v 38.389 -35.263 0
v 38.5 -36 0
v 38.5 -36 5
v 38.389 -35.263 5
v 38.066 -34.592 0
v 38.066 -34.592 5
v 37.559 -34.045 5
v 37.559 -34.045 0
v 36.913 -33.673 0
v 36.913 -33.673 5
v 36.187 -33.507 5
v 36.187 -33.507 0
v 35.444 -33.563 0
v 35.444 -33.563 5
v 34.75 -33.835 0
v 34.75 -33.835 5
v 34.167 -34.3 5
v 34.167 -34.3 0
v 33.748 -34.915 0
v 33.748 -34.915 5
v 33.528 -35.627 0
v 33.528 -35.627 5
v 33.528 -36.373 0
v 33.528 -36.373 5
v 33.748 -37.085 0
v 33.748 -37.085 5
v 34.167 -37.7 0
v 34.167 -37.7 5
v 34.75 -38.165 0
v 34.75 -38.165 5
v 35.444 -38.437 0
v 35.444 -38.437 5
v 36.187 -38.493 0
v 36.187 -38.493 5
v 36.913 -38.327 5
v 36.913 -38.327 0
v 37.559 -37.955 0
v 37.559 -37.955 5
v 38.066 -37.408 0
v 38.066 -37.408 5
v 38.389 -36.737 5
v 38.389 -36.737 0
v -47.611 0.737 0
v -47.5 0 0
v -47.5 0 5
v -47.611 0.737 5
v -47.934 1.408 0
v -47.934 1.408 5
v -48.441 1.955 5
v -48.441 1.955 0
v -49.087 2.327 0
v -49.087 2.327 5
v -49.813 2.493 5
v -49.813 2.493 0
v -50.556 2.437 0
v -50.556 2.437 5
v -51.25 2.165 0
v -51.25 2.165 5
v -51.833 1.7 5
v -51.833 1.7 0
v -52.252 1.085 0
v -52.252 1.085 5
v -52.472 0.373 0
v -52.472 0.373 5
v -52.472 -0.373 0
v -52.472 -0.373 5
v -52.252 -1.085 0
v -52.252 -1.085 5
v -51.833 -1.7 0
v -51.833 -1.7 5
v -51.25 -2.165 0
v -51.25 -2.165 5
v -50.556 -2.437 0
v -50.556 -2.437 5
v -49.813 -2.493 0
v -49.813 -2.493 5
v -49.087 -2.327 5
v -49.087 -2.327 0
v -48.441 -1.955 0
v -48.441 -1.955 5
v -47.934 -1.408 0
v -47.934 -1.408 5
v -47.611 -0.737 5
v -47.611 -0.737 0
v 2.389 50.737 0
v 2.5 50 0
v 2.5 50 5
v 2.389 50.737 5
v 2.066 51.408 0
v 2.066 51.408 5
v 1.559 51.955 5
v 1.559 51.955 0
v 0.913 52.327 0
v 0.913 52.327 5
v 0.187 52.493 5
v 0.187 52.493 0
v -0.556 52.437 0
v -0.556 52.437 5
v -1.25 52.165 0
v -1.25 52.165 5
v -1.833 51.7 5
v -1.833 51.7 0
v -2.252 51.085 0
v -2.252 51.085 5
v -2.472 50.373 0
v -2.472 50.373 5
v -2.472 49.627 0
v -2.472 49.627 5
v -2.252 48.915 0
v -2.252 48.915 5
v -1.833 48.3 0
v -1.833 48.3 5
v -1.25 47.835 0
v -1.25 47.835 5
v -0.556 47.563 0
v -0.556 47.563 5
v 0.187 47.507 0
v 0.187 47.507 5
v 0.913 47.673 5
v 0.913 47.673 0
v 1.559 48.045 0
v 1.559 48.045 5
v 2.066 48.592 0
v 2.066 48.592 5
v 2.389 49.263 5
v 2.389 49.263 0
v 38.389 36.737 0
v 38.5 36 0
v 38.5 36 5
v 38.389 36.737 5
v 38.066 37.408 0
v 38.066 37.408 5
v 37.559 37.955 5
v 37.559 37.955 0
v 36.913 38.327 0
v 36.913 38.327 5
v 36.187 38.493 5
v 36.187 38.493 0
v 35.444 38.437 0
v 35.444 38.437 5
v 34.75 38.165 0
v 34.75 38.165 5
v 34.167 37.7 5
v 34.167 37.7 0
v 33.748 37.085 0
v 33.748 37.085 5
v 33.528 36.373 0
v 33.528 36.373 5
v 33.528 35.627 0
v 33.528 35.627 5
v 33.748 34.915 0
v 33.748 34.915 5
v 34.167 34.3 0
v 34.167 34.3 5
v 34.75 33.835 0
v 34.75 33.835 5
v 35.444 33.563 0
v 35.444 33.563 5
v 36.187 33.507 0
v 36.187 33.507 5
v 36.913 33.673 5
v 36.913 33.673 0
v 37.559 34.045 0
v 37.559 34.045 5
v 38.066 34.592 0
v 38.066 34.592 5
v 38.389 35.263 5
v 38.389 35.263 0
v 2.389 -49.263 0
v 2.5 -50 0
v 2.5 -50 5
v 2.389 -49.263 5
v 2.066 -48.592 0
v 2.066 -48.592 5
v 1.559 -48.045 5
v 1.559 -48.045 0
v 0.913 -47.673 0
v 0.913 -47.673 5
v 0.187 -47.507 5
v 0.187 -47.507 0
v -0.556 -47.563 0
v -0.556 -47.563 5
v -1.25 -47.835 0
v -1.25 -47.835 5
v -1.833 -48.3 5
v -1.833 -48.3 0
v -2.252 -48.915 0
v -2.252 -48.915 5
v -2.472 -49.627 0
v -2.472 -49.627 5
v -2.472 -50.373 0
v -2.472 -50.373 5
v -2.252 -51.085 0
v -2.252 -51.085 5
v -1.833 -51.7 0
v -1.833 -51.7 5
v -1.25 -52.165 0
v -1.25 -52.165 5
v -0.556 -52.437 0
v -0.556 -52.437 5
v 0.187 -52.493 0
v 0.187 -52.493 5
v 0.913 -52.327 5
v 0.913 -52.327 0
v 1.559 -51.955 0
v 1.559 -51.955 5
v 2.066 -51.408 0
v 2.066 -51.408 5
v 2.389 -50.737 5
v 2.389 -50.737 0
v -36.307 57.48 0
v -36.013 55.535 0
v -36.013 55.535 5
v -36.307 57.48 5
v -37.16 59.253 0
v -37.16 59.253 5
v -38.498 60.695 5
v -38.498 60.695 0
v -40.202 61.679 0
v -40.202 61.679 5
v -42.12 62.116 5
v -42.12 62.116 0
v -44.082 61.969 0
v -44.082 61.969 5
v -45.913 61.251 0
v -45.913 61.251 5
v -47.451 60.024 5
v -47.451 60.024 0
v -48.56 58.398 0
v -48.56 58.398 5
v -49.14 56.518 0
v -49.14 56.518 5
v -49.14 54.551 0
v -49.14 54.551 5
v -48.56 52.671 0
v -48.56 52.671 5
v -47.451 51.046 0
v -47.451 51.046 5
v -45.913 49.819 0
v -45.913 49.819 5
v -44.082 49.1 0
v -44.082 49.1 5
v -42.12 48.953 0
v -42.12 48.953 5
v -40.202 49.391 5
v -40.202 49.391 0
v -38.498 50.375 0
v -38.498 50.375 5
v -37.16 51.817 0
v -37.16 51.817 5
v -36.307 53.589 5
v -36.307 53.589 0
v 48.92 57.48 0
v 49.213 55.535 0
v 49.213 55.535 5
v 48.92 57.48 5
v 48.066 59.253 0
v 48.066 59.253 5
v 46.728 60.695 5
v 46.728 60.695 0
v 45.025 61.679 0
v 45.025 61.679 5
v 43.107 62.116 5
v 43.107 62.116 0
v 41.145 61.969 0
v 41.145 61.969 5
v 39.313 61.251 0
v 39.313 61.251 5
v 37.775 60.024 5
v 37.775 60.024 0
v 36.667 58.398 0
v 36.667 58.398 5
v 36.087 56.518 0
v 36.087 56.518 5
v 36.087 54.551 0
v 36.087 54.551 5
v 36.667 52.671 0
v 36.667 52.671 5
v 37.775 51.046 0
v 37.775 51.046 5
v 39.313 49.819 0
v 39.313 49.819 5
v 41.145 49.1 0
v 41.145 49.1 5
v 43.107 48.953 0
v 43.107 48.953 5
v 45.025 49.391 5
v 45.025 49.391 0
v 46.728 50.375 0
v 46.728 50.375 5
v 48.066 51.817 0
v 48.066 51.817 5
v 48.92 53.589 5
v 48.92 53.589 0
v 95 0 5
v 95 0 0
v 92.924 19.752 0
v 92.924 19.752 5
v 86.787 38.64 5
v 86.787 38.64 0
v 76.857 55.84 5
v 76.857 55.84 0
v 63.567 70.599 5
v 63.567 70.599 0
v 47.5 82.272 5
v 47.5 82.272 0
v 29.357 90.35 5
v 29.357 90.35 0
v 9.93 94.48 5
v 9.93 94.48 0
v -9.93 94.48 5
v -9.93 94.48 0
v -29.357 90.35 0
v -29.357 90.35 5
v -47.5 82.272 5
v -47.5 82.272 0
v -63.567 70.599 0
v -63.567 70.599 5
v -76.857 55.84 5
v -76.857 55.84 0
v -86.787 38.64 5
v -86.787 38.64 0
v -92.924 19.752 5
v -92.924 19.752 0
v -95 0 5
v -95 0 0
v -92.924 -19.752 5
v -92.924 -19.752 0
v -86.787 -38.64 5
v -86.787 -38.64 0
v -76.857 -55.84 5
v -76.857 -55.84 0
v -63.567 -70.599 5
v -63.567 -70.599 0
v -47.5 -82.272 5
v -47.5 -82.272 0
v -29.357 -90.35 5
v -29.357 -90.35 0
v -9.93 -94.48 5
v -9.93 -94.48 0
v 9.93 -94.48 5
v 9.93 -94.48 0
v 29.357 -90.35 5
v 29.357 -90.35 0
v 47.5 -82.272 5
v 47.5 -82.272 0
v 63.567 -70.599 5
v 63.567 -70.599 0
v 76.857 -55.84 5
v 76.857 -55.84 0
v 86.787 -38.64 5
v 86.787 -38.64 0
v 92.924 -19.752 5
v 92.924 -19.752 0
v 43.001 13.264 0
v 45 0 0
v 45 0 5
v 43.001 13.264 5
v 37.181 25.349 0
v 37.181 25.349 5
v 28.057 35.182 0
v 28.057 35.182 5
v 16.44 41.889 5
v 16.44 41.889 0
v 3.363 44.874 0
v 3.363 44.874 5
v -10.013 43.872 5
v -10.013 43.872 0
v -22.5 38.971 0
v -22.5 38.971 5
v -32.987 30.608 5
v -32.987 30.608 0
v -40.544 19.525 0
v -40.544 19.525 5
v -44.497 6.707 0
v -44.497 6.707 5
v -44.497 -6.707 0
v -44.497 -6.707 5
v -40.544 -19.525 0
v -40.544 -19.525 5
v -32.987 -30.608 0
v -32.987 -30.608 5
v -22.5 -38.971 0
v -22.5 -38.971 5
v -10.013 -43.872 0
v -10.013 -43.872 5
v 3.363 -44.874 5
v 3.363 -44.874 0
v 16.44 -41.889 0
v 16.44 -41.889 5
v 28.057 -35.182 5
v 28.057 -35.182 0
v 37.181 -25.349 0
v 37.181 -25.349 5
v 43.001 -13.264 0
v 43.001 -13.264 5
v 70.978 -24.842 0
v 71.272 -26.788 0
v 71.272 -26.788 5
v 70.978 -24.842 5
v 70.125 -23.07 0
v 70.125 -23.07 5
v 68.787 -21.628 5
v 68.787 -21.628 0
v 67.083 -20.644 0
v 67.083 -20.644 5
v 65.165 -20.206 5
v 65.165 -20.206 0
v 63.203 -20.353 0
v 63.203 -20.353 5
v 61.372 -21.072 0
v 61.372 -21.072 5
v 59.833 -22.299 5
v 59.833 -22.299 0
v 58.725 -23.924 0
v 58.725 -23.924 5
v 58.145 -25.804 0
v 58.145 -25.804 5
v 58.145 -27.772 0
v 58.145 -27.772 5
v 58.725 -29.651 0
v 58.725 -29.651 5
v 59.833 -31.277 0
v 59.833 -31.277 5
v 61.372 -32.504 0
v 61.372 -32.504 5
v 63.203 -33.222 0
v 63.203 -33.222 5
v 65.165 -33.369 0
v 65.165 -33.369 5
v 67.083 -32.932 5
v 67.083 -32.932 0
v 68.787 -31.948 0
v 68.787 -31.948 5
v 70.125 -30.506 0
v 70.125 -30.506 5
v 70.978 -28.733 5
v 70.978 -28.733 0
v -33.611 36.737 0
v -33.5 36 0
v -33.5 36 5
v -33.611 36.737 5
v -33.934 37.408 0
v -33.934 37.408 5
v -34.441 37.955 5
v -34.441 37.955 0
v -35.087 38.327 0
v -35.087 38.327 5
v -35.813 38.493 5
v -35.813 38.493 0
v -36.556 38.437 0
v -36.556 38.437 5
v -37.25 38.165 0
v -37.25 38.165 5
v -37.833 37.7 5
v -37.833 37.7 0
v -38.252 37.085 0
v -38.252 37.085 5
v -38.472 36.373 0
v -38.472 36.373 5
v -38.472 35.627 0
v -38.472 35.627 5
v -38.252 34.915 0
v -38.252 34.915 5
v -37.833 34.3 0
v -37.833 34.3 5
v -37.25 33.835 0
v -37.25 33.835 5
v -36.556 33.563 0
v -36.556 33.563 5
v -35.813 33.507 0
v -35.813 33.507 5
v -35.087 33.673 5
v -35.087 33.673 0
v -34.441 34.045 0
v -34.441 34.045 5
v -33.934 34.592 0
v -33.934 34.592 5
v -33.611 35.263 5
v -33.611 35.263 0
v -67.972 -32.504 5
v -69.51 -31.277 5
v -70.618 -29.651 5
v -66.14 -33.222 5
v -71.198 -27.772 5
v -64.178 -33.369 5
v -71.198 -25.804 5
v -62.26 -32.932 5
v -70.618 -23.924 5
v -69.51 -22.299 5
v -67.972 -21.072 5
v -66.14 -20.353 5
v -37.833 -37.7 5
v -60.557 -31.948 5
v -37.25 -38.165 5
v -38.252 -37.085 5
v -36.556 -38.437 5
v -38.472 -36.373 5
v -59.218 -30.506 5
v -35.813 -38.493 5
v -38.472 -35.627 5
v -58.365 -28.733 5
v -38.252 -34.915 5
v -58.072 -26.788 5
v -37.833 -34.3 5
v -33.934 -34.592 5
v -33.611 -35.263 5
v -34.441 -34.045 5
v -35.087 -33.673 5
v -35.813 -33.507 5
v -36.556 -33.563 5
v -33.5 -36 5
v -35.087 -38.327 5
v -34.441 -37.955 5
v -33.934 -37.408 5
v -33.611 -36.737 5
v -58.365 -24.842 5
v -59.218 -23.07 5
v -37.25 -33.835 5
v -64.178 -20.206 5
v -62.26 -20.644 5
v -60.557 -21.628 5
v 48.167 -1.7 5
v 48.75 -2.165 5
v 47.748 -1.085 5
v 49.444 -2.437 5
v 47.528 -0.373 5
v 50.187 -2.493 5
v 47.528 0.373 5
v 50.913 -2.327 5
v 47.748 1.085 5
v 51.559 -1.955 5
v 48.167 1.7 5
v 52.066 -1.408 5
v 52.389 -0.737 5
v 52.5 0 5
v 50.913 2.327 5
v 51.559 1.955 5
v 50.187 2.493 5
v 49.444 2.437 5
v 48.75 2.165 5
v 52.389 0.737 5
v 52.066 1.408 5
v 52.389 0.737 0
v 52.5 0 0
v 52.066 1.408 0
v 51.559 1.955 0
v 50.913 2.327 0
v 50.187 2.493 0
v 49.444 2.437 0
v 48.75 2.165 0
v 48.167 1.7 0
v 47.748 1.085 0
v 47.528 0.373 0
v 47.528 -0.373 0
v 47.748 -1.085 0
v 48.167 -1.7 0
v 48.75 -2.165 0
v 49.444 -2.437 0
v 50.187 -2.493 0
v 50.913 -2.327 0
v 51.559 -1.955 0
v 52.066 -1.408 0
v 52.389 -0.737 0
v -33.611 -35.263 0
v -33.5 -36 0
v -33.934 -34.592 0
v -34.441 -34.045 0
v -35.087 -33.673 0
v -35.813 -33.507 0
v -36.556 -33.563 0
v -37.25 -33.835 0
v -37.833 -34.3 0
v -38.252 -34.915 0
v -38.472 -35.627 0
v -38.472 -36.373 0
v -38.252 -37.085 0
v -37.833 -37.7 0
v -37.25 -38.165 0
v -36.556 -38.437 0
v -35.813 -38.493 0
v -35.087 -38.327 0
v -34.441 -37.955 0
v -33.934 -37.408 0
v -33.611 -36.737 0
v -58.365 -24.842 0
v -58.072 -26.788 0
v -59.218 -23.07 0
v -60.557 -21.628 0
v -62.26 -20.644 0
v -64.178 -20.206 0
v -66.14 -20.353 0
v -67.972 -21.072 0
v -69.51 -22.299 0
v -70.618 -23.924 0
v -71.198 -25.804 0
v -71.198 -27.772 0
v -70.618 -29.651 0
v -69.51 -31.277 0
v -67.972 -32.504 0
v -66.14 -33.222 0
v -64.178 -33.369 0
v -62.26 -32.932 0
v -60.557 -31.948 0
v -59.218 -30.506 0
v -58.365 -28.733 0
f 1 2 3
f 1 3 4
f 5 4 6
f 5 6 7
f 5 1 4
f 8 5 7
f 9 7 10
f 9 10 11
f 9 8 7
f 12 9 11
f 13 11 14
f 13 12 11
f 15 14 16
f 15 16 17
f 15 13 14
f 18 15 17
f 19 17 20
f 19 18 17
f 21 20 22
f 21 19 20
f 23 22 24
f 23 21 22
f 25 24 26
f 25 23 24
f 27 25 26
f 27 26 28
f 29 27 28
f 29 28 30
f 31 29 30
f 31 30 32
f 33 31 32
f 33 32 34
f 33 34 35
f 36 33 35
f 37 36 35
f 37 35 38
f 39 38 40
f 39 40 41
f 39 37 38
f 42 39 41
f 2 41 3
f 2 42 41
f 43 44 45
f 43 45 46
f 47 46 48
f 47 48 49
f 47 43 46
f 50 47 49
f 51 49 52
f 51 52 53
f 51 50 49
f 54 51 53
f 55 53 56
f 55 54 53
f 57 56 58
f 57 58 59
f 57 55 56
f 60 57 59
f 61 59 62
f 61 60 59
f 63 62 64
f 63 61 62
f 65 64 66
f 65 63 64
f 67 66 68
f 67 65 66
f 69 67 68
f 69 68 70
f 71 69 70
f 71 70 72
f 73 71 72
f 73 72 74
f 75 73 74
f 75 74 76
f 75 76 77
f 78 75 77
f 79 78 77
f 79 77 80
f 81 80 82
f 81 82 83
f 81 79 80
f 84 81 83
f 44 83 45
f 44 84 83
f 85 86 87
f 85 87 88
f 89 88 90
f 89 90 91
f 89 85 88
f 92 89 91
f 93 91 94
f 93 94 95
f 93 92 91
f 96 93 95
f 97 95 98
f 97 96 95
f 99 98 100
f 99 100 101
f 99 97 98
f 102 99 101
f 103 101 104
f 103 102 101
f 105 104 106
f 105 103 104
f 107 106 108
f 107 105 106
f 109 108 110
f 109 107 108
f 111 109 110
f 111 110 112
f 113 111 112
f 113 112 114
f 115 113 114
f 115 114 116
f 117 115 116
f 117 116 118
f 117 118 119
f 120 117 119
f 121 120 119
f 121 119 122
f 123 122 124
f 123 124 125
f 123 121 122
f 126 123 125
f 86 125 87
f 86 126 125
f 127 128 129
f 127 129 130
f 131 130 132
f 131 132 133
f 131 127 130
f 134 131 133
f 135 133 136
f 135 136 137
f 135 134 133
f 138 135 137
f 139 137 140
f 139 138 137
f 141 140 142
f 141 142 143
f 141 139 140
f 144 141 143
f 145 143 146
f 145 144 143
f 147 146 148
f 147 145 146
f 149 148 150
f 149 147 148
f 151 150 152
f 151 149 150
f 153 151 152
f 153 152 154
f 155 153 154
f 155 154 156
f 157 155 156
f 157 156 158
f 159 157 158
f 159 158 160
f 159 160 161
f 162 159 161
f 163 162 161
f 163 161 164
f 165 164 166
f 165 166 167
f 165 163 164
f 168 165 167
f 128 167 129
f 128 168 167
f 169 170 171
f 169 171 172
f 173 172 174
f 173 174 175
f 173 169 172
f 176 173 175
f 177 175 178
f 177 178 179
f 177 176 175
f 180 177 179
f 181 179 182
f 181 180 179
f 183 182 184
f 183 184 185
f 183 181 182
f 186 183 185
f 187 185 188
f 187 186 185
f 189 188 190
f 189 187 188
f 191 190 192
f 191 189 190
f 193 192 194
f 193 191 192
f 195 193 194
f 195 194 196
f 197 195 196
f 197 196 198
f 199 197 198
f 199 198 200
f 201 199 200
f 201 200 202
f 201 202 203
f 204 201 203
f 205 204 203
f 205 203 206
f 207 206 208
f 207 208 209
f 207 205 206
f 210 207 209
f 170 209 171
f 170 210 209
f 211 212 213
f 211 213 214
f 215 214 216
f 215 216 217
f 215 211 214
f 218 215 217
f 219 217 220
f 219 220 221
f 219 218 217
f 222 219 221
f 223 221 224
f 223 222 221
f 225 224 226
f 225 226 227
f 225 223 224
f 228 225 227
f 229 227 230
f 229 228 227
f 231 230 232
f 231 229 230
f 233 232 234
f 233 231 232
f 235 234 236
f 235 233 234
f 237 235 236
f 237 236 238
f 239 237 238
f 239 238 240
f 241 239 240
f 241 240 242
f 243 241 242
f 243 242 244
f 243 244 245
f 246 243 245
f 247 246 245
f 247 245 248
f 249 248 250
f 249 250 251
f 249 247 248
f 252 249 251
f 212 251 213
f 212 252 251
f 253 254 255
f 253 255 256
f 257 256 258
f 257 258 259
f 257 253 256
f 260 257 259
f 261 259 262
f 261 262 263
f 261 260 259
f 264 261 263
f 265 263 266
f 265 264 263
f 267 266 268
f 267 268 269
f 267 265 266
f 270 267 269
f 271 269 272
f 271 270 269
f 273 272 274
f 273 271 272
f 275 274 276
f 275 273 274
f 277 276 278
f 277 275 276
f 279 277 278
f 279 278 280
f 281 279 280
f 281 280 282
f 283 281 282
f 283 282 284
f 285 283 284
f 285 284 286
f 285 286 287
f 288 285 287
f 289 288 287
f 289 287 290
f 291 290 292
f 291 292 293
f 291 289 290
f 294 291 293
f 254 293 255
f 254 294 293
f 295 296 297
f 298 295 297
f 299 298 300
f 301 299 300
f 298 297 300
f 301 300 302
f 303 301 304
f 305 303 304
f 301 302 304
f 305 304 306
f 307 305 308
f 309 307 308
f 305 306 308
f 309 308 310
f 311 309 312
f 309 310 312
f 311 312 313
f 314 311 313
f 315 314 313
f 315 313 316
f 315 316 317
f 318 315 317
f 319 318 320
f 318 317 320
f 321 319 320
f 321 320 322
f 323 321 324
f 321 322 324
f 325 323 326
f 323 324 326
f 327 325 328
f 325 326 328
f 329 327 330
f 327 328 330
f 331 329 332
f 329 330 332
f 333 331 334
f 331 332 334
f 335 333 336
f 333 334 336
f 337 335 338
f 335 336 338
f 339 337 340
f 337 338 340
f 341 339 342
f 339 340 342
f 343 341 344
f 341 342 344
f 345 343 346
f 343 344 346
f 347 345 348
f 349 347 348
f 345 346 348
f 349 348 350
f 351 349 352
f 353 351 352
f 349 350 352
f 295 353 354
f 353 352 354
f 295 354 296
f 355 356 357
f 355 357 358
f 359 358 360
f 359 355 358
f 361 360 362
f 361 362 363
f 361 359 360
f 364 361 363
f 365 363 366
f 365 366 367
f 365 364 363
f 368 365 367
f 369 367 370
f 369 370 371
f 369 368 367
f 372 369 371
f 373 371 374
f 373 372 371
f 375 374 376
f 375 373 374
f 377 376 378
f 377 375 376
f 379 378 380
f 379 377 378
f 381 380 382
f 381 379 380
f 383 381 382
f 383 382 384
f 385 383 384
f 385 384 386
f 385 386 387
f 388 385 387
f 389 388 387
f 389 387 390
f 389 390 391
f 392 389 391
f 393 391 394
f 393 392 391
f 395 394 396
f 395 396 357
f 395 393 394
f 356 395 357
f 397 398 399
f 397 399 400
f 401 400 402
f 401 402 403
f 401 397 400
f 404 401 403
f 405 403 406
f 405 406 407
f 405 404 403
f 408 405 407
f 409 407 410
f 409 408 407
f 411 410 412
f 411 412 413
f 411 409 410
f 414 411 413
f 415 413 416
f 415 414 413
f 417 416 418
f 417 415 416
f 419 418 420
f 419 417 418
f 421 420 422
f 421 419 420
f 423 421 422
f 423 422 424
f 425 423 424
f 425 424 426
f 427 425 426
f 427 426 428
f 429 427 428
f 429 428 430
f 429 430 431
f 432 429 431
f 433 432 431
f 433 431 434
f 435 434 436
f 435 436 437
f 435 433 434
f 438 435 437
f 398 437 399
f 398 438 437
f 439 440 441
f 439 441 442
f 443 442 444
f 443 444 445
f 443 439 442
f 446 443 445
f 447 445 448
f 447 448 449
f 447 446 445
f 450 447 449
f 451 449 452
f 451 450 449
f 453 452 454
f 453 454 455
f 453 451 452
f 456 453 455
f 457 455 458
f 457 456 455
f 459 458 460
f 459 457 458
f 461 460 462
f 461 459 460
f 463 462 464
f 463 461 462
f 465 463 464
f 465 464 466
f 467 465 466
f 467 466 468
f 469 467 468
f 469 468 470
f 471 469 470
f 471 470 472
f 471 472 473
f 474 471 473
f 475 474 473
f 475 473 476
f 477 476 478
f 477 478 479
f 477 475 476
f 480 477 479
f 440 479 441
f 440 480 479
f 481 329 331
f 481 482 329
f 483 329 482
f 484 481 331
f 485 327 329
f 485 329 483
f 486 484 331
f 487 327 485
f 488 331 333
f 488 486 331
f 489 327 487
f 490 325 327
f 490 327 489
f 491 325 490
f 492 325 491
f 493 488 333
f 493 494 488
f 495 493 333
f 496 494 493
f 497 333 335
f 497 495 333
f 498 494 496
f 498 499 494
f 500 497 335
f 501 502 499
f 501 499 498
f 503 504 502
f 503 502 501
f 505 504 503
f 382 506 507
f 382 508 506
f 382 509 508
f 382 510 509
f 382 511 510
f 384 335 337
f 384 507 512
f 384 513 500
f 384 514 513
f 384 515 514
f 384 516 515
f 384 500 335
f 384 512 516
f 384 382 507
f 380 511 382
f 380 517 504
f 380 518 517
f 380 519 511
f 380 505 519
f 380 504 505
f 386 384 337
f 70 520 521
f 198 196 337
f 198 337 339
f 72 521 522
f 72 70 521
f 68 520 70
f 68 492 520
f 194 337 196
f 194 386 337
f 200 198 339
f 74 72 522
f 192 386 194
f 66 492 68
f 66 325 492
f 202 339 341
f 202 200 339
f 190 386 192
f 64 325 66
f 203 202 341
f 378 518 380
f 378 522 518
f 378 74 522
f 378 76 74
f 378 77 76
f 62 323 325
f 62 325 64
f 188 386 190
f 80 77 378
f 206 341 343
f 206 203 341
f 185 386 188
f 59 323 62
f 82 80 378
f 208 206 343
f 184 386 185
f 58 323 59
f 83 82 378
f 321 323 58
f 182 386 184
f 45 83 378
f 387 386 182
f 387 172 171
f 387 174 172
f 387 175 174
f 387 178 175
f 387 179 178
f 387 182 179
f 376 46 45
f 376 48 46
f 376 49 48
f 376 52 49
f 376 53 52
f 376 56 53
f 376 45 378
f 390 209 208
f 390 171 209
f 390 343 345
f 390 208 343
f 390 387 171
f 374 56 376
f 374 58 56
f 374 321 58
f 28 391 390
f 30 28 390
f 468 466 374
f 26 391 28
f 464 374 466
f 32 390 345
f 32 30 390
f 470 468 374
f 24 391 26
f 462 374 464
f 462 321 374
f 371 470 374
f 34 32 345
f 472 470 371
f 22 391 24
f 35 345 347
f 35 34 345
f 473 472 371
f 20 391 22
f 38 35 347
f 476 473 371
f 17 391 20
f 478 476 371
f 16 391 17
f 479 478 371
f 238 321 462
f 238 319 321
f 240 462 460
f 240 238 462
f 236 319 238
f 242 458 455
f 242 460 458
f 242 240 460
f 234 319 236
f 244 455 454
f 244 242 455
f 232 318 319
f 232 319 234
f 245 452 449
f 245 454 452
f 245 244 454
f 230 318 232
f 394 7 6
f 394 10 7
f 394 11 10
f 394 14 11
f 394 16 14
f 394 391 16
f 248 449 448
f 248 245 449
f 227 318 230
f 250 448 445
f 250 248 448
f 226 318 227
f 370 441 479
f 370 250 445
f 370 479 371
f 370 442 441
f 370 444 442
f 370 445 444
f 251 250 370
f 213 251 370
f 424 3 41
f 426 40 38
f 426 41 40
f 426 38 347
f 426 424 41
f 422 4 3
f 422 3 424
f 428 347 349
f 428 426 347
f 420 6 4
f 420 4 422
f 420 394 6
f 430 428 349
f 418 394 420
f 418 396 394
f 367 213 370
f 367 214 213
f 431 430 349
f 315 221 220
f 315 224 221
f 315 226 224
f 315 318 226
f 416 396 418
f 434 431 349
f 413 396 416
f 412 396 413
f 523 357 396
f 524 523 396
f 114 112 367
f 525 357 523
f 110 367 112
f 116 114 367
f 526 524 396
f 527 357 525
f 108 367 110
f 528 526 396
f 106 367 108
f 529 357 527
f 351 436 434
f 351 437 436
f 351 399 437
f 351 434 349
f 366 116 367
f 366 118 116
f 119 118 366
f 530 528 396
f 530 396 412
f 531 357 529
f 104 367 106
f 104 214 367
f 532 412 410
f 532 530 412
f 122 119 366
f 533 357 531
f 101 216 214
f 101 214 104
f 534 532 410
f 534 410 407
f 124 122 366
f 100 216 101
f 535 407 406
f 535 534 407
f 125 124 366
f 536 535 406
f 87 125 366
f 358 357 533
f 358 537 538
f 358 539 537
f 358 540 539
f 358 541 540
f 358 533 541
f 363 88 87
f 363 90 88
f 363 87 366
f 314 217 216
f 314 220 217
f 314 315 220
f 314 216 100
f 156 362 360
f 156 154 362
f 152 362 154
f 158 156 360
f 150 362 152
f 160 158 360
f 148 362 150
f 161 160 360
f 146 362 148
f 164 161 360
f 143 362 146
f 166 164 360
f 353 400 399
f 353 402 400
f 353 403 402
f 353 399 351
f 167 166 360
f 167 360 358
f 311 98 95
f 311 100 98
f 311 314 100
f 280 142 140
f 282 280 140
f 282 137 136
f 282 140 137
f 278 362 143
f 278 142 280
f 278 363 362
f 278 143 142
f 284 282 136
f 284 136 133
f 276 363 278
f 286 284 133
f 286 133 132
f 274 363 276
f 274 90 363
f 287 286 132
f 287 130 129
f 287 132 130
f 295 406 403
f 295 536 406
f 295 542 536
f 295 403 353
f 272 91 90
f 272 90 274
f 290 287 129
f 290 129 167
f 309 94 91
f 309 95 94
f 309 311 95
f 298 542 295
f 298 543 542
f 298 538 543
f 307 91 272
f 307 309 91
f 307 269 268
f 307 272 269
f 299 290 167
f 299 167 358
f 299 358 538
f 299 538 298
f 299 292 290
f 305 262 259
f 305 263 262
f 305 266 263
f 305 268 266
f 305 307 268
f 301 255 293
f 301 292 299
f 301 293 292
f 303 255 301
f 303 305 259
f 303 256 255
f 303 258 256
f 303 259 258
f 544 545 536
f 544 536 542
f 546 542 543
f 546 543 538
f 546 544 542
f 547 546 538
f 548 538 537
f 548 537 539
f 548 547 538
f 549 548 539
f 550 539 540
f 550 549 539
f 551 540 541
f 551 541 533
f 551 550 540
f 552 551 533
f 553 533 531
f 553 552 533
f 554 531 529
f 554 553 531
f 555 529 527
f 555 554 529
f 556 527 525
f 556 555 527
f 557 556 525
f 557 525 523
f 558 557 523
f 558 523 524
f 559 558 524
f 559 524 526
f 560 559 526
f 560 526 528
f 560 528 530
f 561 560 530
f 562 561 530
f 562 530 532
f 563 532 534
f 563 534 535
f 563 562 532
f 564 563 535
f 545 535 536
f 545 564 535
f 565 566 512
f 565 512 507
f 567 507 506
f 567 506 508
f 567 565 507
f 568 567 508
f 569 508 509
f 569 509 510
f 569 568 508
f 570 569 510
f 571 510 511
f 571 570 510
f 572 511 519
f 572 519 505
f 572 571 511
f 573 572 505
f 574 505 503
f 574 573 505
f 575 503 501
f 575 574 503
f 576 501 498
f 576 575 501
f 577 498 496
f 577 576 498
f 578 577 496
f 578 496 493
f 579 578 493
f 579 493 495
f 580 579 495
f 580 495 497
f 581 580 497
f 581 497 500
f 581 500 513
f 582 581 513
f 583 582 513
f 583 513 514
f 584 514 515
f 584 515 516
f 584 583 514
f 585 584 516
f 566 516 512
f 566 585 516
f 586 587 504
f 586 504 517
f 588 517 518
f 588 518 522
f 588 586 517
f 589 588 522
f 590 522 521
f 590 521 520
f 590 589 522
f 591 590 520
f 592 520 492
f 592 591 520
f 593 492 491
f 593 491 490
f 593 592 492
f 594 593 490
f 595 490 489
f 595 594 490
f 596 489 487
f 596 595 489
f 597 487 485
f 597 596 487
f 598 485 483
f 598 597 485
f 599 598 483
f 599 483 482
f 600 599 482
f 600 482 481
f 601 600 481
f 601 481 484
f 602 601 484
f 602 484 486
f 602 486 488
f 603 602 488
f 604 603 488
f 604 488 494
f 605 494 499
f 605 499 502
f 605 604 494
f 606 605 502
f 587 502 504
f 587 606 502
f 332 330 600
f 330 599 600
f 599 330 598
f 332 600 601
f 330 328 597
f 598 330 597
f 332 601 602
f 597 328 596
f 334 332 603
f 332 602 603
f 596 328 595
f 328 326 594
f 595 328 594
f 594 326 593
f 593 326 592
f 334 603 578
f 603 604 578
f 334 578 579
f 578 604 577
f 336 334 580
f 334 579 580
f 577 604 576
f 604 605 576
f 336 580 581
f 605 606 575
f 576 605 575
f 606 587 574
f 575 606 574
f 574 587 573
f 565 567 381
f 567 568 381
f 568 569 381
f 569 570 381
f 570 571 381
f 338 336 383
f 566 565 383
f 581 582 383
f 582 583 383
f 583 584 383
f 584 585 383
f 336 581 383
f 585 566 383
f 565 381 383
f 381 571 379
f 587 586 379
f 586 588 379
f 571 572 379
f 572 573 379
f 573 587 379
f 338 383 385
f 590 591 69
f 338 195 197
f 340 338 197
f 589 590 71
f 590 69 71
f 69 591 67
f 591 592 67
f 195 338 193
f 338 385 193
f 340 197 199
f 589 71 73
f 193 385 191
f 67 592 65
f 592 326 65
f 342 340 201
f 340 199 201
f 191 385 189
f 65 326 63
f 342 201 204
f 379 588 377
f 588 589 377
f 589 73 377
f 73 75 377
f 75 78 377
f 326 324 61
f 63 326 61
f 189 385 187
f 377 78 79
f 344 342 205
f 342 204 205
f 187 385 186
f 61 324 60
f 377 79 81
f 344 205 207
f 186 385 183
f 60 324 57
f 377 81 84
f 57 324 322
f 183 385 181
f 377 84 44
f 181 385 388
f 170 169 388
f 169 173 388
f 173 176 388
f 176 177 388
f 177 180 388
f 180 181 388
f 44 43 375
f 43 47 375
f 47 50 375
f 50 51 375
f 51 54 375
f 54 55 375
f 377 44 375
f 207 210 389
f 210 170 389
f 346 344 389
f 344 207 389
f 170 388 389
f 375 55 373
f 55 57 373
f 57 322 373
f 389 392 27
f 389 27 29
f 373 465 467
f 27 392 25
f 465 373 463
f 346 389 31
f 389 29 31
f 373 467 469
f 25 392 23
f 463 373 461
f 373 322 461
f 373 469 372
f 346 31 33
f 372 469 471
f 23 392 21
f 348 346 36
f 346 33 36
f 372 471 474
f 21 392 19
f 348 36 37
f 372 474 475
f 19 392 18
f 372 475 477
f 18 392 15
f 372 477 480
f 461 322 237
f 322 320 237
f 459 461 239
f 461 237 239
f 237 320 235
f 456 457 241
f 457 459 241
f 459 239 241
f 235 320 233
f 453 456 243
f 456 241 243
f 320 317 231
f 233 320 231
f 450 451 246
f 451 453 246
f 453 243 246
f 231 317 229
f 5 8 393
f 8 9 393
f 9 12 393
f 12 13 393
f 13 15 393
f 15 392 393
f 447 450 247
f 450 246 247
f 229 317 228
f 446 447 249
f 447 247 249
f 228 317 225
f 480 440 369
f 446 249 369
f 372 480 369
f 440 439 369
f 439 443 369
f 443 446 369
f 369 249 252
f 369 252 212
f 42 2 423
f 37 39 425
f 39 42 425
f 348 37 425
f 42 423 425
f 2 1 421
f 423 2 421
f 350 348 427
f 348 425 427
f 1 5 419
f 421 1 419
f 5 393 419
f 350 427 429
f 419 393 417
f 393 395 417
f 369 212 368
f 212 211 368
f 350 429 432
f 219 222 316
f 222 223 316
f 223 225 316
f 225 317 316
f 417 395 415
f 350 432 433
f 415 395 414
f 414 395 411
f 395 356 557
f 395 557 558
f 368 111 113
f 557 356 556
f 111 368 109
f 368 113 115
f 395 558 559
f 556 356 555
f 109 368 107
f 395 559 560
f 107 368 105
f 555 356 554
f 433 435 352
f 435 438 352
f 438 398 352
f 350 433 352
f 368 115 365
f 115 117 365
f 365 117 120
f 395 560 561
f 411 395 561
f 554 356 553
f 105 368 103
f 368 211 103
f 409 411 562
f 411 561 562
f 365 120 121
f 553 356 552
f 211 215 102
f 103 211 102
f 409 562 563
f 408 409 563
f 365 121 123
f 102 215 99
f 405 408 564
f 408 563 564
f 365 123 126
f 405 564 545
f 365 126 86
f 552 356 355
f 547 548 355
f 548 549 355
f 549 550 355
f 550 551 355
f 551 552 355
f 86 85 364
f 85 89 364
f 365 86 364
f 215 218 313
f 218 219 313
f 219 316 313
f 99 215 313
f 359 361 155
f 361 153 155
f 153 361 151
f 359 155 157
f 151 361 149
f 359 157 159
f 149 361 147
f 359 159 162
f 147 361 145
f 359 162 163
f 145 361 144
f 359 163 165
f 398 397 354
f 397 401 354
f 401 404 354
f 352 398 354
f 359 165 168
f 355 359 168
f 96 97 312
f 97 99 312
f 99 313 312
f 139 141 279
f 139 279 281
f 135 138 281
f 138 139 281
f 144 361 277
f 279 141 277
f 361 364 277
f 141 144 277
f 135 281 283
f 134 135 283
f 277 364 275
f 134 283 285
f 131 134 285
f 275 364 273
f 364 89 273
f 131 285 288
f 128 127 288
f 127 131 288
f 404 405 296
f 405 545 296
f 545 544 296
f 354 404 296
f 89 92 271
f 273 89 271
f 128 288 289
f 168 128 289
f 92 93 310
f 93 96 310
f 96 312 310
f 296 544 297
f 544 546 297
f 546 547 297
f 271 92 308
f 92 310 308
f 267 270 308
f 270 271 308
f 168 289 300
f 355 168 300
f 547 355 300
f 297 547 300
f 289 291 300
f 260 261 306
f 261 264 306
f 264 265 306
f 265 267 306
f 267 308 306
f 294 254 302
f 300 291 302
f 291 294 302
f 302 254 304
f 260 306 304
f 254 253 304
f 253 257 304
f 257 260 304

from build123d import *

# Parameters (mm, degrees)
F0_R     = 95
F0_R_2   = 6.6
F0_R_3   = 2.5
F0_R_4   = 45
F1_DEPTH = 5


with BuildPart() as f1:
    # F0 (on Top) → F1 (new body)
    with BuildSketch(Plane.XY):
        Circle(F0_R)
        with Locations((-64.671567, -26.78784)):
            Circle(F0_R_2, mode=Mode.SUBTRACT)
        with Locations((-36, -36)):
            Circle(F0_R_3, mode=Mode.SUBTRACT)
        with Locations((0, -50)):
            Circle(F0_R_3, mode=Mode.SUBTRACT)
        with Locations((36, -36)):
            Circle(F0_R_3, mode=Mode.SUBTRACT)
        with Locations((64.671567, -26.78784)):
            Circle(F0_R_2, mode=Mode.SUBTRACT)
        with Locations((-50, 0)):
            Circle(F0_R_3, mode=Mode.SUBTRACT)
        with Locations((-36, 36)):
            Circle(F0_R_3, mode=Mode.SUBTRACT)
        with Locations((-42.6133, 55.534734)):
            Circle(F0_R_2, mode=Mode.SUBTRACT)
        Circle(F0_R_4, mode=Mode.SUBTRACT)
        with Locations((36, 36)):
            Circle(F0_R_3, mode=Mode.SUBTRACT)
        with Locations((50, 0)):
            Circle(F0_R_3, mode=Mode.SUBTRACT)
        with Locations((0, 50)):
            Circle(F0_R_3, mode=Mode.SUBTRACT)
        with Locations((42.6133, 55.534734)):
            Circle(F0_R_2, mode=Mode.SUBTRACT)
    extrude(amount=F1_DEPTH)


solid = f1.part
